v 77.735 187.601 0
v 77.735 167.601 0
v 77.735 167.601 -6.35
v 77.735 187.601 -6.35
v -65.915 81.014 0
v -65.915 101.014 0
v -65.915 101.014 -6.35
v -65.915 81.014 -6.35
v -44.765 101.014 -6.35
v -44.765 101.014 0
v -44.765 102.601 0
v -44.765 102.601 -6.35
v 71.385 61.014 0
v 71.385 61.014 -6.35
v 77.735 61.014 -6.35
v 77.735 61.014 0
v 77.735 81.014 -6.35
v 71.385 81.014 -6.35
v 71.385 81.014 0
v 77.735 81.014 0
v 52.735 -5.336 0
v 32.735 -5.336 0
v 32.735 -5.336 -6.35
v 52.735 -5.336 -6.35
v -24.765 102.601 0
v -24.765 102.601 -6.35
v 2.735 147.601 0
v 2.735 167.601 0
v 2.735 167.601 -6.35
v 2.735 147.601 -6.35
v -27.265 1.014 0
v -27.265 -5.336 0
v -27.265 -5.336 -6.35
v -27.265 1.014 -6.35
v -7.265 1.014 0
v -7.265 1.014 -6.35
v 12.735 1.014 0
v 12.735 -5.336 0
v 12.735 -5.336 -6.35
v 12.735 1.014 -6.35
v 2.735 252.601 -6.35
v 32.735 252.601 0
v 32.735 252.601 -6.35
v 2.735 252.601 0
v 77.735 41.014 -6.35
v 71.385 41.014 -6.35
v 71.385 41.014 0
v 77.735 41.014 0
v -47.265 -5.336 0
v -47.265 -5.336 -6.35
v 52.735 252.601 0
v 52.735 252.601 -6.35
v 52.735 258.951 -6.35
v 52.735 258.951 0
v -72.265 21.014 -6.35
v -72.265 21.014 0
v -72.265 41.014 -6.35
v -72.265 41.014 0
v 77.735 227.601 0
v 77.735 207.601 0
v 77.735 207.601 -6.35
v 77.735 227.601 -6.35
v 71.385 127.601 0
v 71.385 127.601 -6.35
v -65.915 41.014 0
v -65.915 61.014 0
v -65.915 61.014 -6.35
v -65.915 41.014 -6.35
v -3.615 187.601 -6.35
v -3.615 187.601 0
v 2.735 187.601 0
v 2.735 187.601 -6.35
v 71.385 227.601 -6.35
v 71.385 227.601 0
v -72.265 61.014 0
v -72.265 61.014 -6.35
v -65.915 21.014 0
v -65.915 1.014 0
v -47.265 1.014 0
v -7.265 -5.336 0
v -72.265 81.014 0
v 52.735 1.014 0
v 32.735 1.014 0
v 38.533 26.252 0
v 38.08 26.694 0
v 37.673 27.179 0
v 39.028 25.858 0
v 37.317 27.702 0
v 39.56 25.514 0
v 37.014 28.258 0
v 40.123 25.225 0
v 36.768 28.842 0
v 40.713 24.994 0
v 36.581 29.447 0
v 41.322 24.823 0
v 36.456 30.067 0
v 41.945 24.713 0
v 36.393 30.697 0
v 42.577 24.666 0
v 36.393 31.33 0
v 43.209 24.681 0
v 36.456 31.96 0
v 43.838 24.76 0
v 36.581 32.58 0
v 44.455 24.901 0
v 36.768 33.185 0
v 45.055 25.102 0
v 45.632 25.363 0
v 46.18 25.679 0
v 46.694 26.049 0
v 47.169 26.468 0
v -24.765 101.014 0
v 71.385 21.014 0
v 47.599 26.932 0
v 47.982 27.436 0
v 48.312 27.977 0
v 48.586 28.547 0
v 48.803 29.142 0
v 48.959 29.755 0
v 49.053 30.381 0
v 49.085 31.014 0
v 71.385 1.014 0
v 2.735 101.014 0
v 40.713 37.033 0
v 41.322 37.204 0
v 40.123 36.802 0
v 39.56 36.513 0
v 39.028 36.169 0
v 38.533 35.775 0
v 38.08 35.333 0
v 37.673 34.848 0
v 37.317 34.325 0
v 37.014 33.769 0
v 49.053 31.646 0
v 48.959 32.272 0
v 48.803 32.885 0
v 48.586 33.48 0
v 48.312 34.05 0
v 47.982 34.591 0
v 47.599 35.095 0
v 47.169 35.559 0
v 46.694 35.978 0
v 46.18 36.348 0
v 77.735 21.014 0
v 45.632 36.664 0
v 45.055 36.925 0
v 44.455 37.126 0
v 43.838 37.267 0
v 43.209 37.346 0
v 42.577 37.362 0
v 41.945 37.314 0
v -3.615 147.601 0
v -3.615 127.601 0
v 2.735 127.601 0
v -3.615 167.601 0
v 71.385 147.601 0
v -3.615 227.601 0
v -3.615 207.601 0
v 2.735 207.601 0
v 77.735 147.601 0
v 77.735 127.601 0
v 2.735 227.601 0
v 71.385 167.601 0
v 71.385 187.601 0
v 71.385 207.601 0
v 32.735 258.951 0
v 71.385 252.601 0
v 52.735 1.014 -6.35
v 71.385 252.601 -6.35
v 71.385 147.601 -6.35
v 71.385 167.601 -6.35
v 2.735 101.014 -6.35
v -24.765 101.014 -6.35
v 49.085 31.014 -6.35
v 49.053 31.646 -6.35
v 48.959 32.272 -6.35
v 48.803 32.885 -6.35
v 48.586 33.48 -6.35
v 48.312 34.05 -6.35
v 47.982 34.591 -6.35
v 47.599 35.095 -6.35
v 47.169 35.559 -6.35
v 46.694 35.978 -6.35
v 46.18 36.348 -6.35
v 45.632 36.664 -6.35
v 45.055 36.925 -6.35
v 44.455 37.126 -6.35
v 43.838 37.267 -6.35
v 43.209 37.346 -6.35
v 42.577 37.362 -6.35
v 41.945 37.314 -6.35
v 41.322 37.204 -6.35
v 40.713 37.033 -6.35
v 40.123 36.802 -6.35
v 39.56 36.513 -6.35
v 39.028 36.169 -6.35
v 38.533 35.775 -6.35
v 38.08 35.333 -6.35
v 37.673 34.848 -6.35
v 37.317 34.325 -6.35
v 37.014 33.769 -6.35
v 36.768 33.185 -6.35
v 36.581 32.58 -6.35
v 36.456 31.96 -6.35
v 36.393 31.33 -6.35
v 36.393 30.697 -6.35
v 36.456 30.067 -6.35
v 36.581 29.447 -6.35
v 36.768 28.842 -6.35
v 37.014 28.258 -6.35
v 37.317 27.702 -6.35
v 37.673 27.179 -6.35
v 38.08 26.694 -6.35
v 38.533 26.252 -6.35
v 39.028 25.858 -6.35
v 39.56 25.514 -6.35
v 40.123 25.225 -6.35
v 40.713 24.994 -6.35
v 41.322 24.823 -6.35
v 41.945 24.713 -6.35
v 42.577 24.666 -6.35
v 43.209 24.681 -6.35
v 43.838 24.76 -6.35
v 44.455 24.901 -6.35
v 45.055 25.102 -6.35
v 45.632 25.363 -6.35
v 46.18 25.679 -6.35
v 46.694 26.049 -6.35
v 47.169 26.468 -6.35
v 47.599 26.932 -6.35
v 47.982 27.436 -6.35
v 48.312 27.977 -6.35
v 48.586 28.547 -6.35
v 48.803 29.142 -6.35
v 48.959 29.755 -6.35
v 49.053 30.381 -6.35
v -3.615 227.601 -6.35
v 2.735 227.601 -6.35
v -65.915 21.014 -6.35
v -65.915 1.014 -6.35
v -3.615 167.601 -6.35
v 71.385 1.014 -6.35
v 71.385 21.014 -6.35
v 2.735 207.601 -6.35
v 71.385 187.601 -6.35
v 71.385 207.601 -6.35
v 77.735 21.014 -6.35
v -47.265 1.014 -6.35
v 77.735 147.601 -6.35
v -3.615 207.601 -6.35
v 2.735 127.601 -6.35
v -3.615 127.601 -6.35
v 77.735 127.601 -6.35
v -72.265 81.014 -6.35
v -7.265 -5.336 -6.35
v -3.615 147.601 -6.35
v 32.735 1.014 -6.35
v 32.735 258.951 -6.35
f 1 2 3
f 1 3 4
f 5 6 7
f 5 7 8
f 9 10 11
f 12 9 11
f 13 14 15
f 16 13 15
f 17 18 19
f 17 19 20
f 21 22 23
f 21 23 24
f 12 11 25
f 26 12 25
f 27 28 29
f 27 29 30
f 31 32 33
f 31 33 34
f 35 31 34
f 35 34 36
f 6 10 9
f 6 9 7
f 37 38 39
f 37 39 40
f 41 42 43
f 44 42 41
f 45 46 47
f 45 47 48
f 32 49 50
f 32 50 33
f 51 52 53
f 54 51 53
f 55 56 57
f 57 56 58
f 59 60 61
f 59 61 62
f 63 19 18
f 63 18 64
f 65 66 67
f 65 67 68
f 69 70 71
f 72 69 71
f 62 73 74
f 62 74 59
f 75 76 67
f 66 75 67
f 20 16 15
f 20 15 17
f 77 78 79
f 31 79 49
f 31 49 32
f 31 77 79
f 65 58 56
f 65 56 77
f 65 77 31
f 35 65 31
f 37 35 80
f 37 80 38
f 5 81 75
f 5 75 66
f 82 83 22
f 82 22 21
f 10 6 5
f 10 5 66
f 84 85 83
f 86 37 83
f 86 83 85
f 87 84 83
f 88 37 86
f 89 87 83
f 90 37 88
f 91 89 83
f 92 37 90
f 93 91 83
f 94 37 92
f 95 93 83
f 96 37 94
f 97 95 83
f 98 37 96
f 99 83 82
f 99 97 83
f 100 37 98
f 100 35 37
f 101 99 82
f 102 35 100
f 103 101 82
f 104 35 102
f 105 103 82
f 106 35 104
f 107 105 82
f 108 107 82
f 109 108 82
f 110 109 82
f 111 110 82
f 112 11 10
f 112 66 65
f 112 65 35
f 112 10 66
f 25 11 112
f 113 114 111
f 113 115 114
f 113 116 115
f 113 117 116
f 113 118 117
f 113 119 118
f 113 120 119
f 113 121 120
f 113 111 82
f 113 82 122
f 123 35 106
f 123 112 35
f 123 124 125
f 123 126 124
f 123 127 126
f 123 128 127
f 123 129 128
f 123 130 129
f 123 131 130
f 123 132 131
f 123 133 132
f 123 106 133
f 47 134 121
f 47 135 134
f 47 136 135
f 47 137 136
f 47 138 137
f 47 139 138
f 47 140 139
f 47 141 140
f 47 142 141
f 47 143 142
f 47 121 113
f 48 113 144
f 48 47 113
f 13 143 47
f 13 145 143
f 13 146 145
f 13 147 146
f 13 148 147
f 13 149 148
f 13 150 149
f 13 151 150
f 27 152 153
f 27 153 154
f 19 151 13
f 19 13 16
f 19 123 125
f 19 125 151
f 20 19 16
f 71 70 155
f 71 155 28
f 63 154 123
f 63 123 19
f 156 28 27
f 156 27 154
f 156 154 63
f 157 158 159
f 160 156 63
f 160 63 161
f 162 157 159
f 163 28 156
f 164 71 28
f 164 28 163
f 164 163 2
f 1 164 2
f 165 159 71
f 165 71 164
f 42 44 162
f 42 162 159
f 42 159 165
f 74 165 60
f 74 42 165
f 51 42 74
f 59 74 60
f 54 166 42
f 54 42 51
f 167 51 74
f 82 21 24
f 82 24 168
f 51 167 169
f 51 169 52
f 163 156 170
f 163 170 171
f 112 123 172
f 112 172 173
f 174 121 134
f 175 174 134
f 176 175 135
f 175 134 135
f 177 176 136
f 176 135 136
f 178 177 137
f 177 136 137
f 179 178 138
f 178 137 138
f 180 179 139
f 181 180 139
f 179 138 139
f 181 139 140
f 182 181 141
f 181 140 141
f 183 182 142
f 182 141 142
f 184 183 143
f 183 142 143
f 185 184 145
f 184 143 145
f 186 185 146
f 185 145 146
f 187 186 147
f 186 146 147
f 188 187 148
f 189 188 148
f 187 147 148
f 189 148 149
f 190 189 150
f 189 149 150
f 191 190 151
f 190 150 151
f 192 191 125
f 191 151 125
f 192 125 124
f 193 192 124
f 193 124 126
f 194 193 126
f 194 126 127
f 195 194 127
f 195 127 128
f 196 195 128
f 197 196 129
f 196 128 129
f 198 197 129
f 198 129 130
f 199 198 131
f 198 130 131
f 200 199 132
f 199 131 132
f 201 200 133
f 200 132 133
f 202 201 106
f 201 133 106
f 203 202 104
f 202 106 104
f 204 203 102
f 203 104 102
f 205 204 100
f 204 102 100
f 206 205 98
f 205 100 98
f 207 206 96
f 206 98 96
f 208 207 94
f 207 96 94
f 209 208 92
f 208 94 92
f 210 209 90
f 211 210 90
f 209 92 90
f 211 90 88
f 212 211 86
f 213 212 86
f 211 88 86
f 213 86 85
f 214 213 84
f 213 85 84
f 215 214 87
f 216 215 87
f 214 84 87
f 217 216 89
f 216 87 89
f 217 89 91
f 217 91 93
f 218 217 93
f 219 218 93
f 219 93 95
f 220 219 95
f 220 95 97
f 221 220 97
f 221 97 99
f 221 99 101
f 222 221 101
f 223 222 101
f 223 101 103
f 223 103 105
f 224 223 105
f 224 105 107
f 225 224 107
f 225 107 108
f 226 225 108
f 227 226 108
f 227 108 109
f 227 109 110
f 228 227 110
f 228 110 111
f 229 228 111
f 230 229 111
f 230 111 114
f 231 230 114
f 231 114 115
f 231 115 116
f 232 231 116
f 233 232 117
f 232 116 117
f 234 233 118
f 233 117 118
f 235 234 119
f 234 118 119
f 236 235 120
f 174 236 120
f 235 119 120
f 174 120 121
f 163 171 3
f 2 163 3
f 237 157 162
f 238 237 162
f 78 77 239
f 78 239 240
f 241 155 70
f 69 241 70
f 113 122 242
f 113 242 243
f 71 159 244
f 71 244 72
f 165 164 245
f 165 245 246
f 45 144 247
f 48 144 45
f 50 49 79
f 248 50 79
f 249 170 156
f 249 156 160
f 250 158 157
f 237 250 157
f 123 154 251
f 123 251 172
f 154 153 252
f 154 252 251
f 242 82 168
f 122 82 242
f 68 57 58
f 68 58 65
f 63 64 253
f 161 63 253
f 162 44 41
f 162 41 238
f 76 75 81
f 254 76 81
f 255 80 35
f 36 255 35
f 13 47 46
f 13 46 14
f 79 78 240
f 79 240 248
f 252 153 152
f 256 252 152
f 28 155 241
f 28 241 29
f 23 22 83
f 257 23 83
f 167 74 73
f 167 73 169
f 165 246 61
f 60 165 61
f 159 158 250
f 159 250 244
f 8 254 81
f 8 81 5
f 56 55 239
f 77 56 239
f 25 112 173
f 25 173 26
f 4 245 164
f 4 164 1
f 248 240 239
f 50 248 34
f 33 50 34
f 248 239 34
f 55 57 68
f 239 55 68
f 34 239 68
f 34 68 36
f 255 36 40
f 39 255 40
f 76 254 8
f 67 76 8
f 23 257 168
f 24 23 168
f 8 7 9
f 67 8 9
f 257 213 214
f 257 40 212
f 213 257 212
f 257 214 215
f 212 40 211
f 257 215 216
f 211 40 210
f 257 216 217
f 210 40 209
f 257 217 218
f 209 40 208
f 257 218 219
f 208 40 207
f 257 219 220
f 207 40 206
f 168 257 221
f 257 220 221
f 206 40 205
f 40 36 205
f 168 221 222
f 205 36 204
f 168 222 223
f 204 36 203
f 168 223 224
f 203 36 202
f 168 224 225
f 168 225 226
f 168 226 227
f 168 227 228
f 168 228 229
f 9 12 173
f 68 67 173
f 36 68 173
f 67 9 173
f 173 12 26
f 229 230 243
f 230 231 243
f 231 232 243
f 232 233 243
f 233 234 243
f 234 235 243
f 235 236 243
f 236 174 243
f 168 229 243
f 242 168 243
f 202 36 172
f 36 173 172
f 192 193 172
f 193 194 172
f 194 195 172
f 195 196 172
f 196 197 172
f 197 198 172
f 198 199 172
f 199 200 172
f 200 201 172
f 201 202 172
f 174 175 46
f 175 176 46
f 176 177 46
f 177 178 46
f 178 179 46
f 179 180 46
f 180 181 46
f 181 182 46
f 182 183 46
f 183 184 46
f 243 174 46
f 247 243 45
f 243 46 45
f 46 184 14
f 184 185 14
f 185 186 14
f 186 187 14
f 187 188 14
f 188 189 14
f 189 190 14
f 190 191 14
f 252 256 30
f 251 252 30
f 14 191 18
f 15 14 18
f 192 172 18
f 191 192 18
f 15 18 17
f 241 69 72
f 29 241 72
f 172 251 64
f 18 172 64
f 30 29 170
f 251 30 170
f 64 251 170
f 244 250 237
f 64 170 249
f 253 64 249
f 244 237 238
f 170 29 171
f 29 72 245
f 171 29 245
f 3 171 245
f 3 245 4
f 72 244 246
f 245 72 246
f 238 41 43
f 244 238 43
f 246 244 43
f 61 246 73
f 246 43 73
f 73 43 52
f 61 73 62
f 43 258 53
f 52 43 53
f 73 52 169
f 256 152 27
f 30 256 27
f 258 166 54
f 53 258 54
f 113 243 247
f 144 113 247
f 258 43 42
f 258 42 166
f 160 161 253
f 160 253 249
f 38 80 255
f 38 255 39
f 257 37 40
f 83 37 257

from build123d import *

# Parameters (mm, degrees)
SKETCH1_R           = 19.125454448
SKETCH1_W           = 20
SKETCH1_H           = 1.5875
SKETCH1_W_2         = 6.35
SKETCH1_H_2         = 20
SKETCH1_H_3         = 6.35
SKETCH1_R_2         = 6.35
BOSS_EXTRUDE1_DEPTH = 6.35


with BuildPart() as part:
    # Sketch1 → Boss-Extrude1 (new body)
    with BuildSketch(Plane.XY):
        Polygon((71.384937154, 207.60103085), (71.384937154, 227.60103085), (71.384937154, 252.60103085), (52.734937154, 252.60103085), (32.734937154, 252.60103085), (2.734937154, 252.60103085), (2.734937154, 227.60103085), (2.734937154, 207.60103085), (2.734937154, 187.60103085), (2.734937154, 167.60103085), (2.734937154, 147.60103085), (2.734937154, 127.60103085), (2.734937154, 102.60103085), (2.734937154, 101.01353085), (-24.765062846, 101.01353085), (-44.765062846, 101.01353085), (-65.915062846, 101.01353085), (-65.915062846, 81.01353085), (-65.915062846, 61.01353085), (-65.915062846, 41.01353085), (-65.915062846, 21.01353085), (-65.915062846, 1.01353085), (-47.265062846, 1.01353085), (-27.265062846, 1.01353085), (-7.265062846, 1.01353085), (12.734937154, 1.01353085), (32.734937154, 1.01353085), (52.734937154, 1.01353085), (71.384937154, 1.01353085), (71.384937154, 21.01353085), (71.384937154, 41.01353085), (71.384937154, 61.01353085), (71.384937154, 81.01353085), (71.384937154, 127.60103085), (71.384937154, 147.60103085), (71.384937154, 167.60103085), (71.384937154, 187.60103085), align=None)
        with Locations((42.734937154, 31.01353085)):
            Circle(SKETCH1_R, mode=Mode.SUBTRACT)
        with Locations((-34.765062846, 101.80728085)):
            Rectangle(SKETCH1_W, SKETCH1_H)
        with Locations((-69.090062846, 71.01353085)):
            Rectangle(SKETCH1_W_2, SKETCH1_H_2)
        with Locations((-69.090062846, 31.01353085)):
            Rectangle(SKETCH1_W_2, SKETCH1_H_2)
        with Locations((-37.265062846, -2.16146915)):
            Rectangle(SKETCH1_W, SKETCH1_H_3)
        with Locations((2.734937154, -2.16146915)):
            Rectangle(SKETCH1_W, SKETCH1_H_3)
        with Locations((42.734937154, -2.16146915)):
            Rectangle(SKETCH1_W, SKETCH1_H_3)
        with Locations((74.559937154, 31.01353085)):
            Rectangle(SKETCH1_W_2, SKETCH1_H_2)
        with Locations((74.559937154, 71.01353085)):
            Rectangle(SKETCH1_W_2, SKETCH1_H_2)
        with Locations((74.559937154, 137.60103085)):
            Rectangle(SKETCH1_W_2, SKETCH1_H_2)
        with Locations((74.559937154, 177.60103085)):
            Rectangle(SKETCH1_W_2, SKETCH1_H_2)
        with Locations((74.559937154, 217.60103085)):
            Rectangle(SKETCH1_W_2, SKETCH1_H_2)
        with Locations((42.734937154, 255.77603085)):
            Rectangle(SKETCH1_W, SKETCH1_H_3)
        with Locations((-0.440062846, 217.60103085)):
            Rectangle(SKETCH1_W_2, SKETCH1_H_2)
        with Locations((-0.440062846, 177.60103085)):
            Rectangle(SKETCH1_W_2, SKETCH1_H_2)
        with Locations((-0.440062846, 137.60103085)):
            Rectangle(SKETCH1_W_2, SKETCH1_H_2)
        with Locations((42.734937154, 31.01353085)):
            Circle(SKETCH1_R)
        with Locations((42.734937154, 31.01353085)):
            Circle(SKETCH1_R_2, mode=Mode.SUBTRACT)
    extrude(amount=-BOSS_EXTRUDE1_DEPTH)


solid = part.part
